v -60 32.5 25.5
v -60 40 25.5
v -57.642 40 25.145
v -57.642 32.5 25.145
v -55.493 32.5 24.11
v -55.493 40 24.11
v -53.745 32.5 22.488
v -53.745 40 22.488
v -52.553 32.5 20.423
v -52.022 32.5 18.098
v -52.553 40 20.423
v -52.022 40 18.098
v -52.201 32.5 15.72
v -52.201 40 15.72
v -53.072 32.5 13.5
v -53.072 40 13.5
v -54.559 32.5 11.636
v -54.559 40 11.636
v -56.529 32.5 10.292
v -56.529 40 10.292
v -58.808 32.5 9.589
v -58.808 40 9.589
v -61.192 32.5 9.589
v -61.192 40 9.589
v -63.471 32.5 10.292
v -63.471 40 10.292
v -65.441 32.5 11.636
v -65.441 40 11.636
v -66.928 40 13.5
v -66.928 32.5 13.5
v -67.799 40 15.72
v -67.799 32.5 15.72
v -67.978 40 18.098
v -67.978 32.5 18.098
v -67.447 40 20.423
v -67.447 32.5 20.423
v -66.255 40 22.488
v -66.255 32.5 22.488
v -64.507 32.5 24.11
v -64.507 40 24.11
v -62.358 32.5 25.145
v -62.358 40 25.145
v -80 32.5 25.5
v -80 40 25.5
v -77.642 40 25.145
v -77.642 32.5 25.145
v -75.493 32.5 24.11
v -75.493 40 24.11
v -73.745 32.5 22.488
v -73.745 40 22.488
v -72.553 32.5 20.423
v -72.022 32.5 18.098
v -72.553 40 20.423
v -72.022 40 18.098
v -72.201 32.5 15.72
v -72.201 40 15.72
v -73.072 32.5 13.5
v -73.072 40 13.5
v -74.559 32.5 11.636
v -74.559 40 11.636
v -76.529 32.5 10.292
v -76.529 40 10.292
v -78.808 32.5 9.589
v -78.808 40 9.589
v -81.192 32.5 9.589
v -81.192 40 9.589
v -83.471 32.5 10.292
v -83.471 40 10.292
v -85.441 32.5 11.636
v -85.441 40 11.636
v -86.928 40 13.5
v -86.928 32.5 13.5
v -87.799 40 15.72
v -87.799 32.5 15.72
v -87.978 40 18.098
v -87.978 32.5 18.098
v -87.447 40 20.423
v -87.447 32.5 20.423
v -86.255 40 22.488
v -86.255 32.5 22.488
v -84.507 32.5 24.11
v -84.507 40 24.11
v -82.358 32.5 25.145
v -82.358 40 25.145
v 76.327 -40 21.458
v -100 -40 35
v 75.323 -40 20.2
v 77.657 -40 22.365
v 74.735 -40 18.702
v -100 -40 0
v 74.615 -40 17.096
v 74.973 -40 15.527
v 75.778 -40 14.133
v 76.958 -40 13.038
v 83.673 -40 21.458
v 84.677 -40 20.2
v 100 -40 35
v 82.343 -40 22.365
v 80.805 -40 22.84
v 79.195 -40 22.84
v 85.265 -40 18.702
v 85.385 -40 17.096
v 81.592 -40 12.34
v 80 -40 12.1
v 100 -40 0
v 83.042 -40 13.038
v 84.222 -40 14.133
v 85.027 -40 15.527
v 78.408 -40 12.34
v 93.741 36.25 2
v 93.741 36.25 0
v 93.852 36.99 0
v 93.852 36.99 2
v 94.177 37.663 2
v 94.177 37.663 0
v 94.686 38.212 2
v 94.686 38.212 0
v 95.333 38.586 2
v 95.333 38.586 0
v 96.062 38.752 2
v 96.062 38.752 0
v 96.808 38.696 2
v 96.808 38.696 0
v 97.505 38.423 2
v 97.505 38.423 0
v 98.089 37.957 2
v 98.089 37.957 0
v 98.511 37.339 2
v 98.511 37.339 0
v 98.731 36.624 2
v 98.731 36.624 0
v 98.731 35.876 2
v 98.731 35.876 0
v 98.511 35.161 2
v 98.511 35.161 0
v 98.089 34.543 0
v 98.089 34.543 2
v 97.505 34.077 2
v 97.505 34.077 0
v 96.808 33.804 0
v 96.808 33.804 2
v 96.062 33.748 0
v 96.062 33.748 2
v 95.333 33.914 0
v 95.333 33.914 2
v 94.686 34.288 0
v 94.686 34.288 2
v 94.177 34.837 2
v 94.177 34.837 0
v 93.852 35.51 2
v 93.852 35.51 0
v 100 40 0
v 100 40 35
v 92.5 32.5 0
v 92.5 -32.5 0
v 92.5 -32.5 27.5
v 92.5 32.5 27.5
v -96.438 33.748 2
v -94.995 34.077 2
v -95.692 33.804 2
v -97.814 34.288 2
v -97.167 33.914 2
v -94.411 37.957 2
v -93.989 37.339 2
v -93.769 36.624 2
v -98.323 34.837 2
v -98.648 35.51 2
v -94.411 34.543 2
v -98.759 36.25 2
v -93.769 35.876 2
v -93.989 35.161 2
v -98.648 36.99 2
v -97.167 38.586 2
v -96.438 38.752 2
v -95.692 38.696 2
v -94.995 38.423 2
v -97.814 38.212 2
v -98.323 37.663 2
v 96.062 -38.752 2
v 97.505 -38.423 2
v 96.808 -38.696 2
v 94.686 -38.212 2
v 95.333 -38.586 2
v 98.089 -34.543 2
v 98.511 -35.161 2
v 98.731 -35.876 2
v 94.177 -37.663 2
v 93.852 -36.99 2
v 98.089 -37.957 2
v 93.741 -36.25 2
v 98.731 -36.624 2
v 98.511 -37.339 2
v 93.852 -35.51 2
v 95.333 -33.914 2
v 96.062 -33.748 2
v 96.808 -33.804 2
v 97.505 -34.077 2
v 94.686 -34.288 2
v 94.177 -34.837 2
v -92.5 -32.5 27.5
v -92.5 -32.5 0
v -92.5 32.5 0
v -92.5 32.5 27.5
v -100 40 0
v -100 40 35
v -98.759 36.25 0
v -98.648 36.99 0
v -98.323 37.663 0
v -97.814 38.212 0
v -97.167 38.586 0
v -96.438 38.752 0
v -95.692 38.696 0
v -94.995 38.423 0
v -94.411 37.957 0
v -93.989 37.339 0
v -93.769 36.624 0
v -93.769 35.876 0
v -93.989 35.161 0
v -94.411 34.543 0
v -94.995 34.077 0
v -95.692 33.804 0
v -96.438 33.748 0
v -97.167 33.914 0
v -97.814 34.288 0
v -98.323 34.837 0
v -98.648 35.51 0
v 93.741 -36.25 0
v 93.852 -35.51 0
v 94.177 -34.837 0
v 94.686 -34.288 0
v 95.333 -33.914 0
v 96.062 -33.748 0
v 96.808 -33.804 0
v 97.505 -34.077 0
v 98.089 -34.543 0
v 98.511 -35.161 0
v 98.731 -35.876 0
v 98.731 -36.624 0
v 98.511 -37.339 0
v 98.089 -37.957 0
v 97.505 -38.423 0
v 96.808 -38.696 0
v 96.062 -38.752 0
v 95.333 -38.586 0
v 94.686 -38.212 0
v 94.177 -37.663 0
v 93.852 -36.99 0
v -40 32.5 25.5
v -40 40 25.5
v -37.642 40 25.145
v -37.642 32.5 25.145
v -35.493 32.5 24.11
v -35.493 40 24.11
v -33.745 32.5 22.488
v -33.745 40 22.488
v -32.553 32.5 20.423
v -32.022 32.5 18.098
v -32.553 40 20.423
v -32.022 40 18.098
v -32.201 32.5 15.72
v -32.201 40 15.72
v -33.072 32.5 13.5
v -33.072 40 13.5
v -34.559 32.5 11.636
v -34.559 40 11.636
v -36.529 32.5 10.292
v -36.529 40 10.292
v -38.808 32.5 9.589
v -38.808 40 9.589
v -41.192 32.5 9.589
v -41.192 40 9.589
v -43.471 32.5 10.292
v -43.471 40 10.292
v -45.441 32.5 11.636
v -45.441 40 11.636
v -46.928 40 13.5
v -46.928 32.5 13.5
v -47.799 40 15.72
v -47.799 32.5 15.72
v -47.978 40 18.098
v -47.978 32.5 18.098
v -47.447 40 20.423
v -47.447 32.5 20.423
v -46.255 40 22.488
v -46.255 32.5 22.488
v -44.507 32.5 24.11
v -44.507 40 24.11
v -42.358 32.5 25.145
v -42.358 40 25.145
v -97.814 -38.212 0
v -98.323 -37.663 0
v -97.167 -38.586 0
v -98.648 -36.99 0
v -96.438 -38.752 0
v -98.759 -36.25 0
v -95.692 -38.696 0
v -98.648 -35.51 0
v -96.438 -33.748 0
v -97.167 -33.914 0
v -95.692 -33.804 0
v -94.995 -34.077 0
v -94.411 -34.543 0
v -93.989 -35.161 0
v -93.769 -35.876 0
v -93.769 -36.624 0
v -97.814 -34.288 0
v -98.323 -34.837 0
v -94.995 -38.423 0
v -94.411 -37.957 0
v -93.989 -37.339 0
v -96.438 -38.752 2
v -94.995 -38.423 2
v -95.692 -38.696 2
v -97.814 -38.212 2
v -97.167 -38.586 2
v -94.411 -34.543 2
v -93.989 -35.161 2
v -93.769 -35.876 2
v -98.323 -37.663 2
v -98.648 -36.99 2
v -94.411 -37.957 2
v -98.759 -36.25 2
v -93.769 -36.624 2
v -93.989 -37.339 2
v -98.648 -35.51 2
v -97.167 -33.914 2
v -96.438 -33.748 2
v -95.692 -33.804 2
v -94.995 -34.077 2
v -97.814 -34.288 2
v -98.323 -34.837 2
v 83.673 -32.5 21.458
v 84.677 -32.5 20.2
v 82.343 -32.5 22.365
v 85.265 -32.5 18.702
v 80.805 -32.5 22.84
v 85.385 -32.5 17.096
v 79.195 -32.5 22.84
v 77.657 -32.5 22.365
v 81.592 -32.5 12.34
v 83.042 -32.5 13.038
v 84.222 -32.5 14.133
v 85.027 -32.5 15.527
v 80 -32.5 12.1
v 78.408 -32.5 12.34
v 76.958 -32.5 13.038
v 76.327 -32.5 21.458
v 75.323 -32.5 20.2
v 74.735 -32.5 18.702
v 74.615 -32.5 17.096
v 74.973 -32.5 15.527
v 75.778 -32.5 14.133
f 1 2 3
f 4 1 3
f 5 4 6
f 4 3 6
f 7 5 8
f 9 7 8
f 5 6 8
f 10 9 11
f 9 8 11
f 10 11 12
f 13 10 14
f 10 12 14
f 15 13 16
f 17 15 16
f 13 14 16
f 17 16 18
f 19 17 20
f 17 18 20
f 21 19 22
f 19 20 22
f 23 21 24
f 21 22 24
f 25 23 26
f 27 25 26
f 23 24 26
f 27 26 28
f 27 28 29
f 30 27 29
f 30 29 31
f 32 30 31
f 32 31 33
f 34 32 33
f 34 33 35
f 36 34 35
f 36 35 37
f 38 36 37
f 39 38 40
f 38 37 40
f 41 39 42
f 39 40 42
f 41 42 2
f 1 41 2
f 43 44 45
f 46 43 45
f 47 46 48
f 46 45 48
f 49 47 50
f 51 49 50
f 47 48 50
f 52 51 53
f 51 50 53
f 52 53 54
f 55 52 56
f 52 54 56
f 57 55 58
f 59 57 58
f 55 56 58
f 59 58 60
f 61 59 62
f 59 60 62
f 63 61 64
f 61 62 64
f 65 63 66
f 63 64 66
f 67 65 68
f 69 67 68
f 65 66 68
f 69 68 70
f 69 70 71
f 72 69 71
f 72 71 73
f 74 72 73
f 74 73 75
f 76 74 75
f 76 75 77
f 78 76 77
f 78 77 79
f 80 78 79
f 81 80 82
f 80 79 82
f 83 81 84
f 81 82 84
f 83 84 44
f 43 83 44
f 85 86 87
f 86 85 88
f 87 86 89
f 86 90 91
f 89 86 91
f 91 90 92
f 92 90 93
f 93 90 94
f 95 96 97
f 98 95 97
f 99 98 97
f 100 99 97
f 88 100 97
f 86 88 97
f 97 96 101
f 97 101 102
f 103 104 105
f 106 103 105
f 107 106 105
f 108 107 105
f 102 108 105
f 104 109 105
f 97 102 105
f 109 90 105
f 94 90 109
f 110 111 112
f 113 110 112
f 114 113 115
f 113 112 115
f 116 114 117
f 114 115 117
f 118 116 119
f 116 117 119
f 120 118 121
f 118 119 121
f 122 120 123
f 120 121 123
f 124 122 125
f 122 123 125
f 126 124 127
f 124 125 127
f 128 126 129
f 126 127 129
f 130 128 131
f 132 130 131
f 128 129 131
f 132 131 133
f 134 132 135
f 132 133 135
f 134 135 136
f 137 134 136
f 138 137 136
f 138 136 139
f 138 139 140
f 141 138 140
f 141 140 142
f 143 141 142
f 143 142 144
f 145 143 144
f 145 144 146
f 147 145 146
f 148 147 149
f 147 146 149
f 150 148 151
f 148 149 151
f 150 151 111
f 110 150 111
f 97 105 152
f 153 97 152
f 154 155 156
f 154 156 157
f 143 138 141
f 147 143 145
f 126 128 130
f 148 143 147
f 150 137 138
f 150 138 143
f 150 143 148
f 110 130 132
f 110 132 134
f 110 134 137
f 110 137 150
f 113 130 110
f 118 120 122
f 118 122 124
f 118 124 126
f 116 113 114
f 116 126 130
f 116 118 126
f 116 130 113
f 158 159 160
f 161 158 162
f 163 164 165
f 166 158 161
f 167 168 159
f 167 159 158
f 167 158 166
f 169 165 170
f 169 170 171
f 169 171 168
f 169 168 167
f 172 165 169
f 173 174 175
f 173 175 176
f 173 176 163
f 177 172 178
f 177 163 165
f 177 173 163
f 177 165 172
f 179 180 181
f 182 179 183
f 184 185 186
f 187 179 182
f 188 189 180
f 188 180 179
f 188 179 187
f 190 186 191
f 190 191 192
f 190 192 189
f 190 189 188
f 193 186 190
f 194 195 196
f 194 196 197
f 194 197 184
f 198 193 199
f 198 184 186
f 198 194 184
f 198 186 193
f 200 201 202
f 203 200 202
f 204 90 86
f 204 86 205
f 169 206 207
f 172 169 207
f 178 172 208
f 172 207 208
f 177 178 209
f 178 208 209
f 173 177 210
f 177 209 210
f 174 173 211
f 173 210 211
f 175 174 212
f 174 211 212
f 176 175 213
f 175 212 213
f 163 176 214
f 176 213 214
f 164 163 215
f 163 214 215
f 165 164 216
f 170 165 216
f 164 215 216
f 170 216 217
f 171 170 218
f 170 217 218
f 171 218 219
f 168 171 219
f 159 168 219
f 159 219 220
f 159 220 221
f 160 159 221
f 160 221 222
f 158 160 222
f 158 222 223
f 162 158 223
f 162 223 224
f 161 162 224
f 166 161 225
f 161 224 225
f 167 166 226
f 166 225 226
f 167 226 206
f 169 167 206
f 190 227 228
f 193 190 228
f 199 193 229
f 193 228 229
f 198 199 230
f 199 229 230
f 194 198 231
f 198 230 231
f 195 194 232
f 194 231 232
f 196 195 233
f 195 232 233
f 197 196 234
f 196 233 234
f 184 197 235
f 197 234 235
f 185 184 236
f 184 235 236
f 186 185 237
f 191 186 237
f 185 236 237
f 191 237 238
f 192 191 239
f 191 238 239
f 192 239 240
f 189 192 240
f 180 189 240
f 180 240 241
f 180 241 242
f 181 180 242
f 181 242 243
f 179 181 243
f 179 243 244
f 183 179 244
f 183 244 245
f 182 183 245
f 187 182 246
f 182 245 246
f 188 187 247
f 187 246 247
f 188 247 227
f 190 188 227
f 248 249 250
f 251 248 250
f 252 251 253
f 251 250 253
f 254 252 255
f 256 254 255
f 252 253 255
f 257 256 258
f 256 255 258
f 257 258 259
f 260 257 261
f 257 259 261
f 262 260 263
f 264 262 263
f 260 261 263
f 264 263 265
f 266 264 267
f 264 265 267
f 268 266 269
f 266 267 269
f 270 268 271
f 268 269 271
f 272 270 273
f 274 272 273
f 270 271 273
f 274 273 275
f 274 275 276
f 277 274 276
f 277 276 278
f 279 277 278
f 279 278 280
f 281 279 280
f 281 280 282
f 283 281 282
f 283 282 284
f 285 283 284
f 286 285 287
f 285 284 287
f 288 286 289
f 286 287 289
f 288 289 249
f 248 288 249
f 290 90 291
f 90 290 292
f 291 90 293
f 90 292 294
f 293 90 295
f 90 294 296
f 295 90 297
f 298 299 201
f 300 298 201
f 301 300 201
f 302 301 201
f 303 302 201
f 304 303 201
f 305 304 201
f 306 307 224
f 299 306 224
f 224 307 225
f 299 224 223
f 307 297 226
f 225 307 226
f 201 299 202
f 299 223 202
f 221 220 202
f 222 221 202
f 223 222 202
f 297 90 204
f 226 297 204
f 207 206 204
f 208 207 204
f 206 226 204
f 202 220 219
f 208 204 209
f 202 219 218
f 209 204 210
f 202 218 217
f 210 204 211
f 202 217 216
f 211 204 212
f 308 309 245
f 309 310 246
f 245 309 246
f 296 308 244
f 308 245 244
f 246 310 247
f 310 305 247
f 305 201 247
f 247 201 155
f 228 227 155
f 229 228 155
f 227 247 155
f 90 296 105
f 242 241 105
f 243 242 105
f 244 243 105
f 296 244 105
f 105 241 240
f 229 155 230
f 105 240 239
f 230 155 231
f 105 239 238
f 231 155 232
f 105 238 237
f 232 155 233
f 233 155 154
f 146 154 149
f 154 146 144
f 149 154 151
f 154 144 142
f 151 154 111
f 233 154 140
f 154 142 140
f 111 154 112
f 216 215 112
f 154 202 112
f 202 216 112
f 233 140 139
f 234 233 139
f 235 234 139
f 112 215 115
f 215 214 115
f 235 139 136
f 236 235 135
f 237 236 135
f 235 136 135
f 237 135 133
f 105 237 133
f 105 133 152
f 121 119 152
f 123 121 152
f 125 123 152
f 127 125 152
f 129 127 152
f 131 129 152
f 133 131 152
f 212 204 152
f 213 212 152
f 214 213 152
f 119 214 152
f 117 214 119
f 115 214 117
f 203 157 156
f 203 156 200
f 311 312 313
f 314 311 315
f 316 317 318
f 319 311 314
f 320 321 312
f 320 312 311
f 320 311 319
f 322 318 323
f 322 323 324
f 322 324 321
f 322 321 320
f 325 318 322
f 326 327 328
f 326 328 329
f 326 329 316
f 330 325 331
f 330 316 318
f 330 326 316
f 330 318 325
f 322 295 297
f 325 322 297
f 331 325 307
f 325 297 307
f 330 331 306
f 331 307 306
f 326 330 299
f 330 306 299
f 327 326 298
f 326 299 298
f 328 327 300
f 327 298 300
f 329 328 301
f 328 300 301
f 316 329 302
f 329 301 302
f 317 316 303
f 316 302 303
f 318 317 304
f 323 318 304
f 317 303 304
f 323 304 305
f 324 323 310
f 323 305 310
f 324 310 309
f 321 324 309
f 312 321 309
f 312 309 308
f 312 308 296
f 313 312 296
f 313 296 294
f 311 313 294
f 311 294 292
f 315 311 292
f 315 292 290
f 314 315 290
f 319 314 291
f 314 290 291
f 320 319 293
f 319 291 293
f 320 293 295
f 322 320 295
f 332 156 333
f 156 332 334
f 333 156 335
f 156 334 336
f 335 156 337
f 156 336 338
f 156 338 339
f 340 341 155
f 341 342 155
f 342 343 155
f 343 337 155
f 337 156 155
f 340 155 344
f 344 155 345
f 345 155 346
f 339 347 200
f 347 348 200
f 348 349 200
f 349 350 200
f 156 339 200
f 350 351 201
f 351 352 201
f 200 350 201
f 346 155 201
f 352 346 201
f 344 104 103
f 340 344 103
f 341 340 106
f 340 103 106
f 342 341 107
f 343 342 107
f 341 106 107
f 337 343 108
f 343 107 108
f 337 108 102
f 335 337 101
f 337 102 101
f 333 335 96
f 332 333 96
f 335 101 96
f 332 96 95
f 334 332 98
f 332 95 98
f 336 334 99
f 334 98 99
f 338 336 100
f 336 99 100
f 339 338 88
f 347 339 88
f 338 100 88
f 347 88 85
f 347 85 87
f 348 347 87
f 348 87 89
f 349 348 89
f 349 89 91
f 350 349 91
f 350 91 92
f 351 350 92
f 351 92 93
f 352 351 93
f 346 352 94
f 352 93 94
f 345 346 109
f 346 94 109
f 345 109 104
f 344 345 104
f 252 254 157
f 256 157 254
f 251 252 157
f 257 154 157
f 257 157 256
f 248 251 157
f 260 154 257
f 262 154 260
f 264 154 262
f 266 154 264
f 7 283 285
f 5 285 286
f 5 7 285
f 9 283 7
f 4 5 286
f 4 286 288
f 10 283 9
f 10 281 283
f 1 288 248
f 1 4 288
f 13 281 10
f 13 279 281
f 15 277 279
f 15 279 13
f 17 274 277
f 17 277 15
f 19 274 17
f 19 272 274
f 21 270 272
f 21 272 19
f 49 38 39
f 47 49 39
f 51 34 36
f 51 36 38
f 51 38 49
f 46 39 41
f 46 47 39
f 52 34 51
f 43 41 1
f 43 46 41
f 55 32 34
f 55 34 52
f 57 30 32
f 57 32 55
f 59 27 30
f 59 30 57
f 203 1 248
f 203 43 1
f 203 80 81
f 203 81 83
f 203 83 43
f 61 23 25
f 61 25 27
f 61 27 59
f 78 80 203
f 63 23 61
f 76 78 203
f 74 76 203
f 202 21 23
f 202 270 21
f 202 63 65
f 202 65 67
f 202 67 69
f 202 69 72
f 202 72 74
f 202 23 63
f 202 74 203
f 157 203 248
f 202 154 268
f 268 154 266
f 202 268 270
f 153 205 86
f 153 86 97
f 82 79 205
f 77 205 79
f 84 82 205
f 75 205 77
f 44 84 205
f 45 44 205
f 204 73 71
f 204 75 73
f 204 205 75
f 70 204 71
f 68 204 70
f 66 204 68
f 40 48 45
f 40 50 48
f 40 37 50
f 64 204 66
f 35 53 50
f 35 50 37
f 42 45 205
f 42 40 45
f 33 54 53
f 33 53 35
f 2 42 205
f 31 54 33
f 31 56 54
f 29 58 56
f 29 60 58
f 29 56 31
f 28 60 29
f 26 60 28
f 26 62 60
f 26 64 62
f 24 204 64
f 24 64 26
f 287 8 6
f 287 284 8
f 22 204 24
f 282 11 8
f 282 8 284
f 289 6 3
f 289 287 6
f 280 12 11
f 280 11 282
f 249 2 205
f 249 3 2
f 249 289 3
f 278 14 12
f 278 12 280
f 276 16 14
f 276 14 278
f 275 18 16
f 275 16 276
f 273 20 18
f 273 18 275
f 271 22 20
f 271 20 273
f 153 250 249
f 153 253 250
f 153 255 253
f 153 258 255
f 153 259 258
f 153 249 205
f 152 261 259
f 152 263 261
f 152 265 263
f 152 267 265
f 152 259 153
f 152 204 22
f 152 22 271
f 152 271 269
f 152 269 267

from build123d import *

# Parameters (mm, degrees)
CROQUIS1_W              = 200
CROQUIS1_H              = 80
SALIENTE_EXTRUIR1_DEPTH = 35
CROQUIS2_W              = 185
CROQUIS2_H              = 65
CORTAR_EXTRUIR1_DEPTH   = 27.5
CROQUIS3_R              = 8
CORTAR_EXTRUIR2_DEPTH   = 7.5
CROQUIS4_R              = 5.4
CORTAR_EXTRUIR3_DEPTH   = 7.5
CROQUIS5_R              = 2.50919292
CORTAR_EXTRUIR4_DEPTH   = 2


with BuildPart() as part:
    # Croquis1 → Saliente-Extruir1 (new body)
    with BuildSketch(Plane.XY):
        Rectangle(CROQUIS1_W, CROQUIS1_H)
    extrude(amount=SALIENTE_EXTRUIR1_DEPTH)

    # Croquis2 → Cortar-Extruir1 (cut)
    with BuildSketch(Plane(origin=(0, 0, 0), x_dir=(-1, 0, 0), z_dir=(0, 0, -1))):
        Rectangle(CROQUIS2_W, CROQUIS2_H)
    extrude(amount=-CORTAR_EXTRUIR1_DEPTH, mode=Mode.SUBTRACT)

    # Croquis3 → Cortar-Extruir2 (cut)
    with BuildSketch(Plane(origin=(0, 40, 0), x_dir=(1, 0, 0), z_dir=(0, 1, 0))):
        with Locations(Location((-80, -17.5, 0), (0, 0, 270))):
            Circle(CROQUIS3_R)
        with Locations(Location((-60, -17.5, 0), (0, 0, 270))):
            Circle(CROQUIS3_R)
        with Locations(Location((-40, -17.5, 0), (0, 0, 270))):
            Circle(CROQUIS3_R)
    extrude(amount=-CORTAR_EXTRUIR2_DEPTH, mode=Mode.SUBTRACT)

    # Croquis4 → Cortar-Extruir3 (cut)
    with BuildSketch(Plane.XZ.offset(40)):
        with Locations(Location((80, 17.5, 0), (0, 0, 270))):
            Circle(CROQUIS4_R)
    extrude(amount=-CORTAR_EXTRUIR3_DEPTH, mode=Mode.SUBTRACT)

    # Croquis5 → Cortar-Extruir4 (cut)
    with BuildSketch(Plane(origin=(0, 0, 0), x_dir=(-1, 0, 0), z_dir=(0, 0, -1))):
        with Locations((96.25, -36.25)):
            Circle(CROQUIS5_R)
        with Locations((96.25, 36.25)):
            Circle(CROQUIS5_R)
        with Locations((-96.25, 36.25)):
            Circle(CROQUIS5_R)
        with Locations((-96.25, -36.25)):
            Circle(CROQUIS5_R)
    extrude(amount=-CORTAR_EXTRUIR4_DEPTH, mode=Mode.SUBTRACT)


solid = part.part
